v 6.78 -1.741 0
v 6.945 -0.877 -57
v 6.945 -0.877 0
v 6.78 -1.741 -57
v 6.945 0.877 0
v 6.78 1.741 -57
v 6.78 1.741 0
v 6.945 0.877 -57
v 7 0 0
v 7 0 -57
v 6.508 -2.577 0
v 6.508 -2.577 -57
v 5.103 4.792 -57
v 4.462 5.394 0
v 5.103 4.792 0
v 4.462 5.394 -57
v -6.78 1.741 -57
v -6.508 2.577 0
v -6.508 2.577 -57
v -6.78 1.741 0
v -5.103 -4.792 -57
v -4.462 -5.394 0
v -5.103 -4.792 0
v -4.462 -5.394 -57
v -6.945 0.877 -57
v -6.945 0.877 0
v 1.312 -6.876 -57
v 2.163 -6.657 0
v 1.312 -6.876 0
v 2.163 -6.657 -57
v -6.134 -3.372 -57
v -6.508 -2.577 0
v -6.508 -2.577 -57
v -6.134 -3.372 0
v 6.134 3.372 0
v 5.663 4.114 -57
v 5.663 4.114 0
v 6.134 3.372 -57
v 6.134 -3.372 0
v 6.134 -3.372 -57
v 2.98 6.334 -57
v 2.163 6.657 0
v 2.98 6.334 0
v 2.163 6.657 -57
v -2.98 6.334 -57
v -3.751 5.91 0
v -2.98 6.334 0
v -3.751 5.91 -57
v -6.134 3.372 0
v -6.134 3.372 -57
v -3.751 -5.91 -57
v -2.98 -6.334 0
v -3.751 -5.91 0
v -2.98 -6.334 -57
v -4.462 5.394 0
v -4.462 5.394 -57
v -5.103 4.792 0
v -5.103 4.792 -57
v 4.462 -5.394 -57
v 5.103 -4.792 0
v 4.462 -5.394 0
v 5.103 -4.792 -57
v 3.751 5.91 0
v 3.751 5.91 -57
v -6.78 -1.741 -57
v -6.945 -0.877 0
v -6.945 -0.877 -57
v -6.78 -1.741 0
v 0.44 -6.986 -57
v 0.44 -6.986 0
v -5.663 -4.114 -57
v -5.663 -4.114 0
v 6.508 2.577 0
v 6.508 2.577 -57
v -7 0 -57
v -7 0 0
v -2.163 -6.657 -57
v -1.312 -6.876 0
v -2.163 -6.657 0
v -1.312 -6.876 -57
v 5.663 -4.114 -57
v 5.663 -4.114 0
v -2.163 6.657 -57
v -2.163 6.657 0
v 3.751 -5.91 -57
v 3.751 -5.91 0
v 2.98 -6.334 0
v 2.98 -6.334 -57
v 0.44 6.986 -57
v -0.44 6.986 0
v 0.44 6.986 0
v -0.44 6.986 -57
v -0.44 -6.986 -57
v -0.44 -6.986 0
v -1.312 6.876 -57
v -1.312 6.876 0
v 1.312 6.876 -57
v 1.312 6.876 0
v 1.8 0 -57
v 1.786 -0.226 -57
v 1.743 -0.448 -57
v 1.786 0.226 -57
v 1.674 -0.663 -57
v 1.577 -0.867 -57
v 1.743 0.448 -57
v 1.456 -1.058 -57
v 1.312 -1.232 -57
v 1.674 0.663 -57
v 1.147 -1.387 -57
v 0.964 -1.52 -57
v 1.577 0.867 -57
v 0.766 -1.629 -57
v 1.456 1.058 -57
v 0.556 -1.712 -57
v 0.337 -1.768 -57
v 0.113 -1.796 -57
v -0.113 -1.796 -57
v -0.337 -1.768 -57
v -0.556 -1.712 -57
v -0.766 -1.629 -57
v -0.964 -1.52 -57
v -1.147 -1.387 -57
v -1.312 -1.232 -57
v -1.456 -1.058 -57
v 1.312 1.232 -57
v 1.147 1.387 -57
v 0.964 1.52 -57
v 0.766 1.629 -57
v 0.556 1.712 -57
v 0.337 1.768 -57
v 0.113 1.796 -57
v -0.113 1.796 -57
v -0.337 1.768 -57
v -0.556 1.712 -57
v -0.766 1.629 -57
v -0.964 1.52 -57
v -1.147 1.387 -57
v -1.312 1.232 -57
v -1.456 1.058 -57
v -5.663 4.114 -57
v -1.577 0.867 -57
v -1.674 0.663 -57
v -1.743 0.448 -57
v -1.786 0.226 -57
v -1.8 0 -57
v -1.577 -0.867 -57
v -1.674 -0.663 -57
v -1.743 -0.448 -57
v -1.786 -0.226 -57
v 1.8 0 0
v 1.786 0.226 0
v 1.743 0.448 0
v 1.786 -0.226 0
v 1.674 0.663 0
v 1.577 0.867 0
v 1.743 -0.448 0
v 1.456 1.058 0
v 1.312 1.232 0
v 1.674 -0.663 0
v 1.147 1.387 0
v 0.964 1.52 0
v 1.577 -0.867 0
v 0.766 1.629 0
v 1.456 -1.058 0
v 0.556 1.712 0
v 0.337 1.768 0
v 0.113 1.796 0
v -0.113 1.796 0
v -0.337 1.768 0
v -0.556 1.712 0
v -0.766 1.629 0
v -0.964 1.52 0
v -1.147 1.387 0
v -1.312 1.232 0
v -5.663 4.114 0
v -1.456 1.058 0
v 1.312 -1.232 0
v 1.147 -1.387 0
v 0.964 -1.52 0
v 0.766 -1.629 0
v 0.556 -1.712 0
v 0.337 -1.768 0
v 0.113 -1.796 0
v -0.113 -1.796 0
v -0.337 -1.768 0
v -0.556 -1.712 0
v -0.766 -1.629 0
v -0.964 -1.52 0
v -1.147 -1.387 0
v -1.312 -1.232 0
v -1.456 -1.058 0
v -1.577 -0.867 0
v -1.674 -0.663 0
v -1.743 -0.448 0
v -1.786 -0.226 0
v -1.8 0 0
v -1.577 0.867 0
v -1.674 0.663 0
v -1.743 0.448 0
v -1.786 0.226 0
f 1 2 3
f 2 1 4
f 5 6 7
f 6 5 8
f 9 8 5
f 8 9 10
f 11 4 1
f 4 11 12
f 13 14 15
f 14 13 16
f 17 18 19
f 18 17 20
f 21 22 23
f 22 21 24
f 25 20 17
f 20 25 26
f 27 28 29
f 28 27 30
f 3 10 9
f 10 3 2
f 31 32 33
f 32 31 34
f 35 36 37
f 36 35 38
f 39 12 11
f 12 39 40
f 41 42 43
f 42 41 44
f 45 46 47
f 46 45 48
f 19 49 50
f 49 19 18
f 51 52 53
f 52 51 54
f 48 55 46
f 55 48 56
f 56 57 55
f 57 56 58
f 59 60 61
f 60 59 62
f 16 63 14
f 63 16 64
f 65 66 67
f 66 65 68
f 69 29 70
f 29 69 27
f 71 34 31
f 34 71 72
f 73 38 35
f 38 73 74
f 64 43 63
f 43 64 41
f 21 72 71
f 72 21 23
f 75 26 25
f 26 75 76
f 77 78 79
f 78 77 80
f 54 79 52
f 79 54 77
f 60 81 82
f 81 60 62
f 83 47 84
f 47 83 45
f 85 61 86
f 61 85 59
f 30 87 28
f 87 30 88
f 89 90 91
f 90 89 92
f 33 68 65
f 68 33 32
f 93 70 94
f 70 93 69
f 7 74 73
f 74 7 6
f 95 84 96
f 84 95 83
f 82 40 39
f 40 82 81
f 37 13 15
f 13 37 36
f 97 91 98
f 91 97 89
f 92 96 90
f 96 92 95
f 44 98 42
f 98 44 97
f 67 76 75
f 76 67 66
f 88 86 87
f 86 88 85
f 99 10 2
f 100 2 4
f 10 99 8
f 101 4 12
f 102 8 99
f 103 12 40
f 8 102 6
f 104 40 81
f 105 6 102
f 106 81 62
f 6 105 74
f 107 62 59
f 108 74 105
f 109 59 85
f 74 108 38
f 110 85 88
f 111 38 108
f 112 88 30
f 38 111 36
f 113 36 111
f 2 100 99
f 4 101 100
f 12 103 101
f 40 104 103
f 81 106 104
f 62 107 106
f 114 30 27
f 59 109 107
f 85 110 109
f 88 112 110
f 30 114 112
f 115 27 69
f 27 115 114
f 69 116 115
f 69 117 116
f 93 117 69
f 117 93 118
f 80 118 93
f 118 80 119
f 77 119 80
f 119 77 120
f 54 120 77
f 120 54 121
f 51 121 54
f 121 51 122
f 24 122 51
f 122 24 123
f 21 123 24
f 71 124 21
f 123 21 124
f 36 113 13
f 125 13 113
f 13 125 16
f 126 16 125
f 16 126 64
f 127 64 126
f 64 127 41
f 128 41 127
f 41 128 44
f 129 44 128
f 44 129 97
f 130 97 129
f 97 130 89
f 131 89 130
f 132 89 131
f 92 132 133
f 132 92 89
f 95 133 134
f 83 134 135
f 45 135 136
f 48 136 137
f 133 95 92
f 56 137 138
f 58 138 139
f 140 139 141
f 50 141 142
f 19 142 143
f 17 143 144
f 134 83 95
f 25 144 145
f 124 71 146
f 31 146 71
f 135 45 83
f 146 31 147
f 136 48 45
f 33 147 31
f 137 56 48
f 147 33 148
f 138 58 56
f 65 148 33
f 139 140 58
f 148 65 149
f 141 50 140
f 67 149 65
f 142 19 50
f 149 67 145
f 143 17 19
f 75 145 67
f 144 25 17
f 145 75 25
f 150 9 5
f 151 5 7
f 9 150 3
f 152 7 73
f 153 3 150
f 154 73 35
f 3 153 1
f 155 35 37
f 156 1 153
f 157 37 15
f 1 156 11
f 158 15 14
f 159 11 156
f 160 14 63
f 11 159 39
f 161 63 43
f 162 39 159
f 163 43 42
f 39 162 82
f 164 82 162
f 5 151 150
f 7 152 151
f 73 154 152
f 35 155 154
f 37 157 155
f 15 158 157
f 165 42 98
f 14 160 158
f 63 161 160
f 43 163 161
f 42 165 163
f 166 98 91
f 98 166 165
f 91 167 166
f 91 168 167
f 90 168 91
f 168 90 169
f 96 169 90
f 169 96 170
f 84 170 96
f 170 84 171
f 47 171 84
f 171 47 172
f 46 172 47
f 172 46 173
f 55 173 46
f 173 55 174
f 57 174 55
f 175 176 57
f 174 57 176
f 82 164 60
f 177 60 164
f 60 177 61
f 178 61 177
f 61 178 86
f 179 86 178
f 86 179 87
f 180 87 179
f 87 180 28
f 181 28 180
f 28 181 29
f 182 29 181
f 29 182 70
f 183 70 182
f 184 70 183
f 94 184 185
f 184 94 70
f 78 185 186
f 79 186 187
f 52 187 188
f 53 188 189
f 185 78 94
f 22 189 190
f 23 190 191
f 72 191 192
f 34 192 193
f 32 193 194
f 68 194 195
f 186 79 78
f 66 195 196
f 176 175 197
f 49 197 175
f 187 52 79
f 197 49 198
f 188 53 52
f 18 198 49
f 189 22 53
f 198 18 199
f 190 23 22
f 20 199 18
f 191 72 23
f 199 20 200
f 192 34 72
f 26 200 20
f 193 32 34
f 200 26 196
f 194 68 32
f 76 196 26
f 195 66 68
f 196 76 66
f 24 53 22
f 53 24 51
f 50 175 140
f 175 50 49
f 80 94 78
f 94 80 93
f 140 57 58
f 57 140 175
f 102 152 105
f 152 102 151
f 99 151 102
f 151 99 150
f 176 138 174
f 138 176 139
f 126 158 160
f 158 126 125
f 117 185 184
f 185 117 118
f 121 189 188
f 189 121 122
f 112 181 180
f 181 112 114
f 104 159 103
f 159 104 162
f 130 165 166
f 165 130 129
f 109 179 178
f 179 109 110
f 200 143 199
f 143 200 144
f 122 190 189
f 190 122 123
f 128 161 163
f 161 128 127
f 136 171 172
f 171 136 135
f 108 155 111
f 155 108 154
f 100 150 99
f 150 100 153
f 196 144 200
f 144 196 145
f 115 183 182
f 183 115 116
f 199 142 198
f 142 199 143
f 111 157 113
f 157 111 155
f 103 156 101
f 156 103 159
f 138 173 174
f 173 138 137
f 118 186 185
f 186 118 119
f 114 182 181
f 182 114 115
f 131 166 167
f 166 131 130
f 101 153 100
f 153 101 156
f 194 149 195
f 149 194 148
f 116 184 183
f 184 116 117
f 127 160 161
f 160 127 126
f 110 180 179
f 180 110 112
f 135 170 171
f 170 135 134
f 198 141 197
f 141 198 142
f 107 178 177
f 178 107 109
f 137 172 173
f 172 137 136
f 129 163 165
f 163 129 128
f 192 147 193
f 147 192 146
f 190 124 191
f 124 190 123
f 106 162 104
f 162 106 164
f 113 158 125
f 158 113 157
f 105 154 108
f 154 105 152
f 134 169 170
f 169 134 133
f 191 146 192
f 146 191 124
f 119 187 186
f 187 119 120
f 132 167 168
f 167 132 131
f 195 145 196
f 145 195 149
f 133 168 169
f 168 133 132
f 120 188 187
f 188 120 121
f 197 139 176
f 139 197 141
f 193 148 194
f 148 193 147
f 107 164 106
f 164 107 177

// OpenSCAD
$fn = 50;


difference() {
	union() {
		translate(v = [0, 0, -57.0000000000]) {
			cylinder(h = 57, r = 7.0000000000);
		}
	}
	union() {
		#translate(v = [0, 0, -57]) {
			cylinder(h = 57, r = 1.8000000000);
		}
	}
}
